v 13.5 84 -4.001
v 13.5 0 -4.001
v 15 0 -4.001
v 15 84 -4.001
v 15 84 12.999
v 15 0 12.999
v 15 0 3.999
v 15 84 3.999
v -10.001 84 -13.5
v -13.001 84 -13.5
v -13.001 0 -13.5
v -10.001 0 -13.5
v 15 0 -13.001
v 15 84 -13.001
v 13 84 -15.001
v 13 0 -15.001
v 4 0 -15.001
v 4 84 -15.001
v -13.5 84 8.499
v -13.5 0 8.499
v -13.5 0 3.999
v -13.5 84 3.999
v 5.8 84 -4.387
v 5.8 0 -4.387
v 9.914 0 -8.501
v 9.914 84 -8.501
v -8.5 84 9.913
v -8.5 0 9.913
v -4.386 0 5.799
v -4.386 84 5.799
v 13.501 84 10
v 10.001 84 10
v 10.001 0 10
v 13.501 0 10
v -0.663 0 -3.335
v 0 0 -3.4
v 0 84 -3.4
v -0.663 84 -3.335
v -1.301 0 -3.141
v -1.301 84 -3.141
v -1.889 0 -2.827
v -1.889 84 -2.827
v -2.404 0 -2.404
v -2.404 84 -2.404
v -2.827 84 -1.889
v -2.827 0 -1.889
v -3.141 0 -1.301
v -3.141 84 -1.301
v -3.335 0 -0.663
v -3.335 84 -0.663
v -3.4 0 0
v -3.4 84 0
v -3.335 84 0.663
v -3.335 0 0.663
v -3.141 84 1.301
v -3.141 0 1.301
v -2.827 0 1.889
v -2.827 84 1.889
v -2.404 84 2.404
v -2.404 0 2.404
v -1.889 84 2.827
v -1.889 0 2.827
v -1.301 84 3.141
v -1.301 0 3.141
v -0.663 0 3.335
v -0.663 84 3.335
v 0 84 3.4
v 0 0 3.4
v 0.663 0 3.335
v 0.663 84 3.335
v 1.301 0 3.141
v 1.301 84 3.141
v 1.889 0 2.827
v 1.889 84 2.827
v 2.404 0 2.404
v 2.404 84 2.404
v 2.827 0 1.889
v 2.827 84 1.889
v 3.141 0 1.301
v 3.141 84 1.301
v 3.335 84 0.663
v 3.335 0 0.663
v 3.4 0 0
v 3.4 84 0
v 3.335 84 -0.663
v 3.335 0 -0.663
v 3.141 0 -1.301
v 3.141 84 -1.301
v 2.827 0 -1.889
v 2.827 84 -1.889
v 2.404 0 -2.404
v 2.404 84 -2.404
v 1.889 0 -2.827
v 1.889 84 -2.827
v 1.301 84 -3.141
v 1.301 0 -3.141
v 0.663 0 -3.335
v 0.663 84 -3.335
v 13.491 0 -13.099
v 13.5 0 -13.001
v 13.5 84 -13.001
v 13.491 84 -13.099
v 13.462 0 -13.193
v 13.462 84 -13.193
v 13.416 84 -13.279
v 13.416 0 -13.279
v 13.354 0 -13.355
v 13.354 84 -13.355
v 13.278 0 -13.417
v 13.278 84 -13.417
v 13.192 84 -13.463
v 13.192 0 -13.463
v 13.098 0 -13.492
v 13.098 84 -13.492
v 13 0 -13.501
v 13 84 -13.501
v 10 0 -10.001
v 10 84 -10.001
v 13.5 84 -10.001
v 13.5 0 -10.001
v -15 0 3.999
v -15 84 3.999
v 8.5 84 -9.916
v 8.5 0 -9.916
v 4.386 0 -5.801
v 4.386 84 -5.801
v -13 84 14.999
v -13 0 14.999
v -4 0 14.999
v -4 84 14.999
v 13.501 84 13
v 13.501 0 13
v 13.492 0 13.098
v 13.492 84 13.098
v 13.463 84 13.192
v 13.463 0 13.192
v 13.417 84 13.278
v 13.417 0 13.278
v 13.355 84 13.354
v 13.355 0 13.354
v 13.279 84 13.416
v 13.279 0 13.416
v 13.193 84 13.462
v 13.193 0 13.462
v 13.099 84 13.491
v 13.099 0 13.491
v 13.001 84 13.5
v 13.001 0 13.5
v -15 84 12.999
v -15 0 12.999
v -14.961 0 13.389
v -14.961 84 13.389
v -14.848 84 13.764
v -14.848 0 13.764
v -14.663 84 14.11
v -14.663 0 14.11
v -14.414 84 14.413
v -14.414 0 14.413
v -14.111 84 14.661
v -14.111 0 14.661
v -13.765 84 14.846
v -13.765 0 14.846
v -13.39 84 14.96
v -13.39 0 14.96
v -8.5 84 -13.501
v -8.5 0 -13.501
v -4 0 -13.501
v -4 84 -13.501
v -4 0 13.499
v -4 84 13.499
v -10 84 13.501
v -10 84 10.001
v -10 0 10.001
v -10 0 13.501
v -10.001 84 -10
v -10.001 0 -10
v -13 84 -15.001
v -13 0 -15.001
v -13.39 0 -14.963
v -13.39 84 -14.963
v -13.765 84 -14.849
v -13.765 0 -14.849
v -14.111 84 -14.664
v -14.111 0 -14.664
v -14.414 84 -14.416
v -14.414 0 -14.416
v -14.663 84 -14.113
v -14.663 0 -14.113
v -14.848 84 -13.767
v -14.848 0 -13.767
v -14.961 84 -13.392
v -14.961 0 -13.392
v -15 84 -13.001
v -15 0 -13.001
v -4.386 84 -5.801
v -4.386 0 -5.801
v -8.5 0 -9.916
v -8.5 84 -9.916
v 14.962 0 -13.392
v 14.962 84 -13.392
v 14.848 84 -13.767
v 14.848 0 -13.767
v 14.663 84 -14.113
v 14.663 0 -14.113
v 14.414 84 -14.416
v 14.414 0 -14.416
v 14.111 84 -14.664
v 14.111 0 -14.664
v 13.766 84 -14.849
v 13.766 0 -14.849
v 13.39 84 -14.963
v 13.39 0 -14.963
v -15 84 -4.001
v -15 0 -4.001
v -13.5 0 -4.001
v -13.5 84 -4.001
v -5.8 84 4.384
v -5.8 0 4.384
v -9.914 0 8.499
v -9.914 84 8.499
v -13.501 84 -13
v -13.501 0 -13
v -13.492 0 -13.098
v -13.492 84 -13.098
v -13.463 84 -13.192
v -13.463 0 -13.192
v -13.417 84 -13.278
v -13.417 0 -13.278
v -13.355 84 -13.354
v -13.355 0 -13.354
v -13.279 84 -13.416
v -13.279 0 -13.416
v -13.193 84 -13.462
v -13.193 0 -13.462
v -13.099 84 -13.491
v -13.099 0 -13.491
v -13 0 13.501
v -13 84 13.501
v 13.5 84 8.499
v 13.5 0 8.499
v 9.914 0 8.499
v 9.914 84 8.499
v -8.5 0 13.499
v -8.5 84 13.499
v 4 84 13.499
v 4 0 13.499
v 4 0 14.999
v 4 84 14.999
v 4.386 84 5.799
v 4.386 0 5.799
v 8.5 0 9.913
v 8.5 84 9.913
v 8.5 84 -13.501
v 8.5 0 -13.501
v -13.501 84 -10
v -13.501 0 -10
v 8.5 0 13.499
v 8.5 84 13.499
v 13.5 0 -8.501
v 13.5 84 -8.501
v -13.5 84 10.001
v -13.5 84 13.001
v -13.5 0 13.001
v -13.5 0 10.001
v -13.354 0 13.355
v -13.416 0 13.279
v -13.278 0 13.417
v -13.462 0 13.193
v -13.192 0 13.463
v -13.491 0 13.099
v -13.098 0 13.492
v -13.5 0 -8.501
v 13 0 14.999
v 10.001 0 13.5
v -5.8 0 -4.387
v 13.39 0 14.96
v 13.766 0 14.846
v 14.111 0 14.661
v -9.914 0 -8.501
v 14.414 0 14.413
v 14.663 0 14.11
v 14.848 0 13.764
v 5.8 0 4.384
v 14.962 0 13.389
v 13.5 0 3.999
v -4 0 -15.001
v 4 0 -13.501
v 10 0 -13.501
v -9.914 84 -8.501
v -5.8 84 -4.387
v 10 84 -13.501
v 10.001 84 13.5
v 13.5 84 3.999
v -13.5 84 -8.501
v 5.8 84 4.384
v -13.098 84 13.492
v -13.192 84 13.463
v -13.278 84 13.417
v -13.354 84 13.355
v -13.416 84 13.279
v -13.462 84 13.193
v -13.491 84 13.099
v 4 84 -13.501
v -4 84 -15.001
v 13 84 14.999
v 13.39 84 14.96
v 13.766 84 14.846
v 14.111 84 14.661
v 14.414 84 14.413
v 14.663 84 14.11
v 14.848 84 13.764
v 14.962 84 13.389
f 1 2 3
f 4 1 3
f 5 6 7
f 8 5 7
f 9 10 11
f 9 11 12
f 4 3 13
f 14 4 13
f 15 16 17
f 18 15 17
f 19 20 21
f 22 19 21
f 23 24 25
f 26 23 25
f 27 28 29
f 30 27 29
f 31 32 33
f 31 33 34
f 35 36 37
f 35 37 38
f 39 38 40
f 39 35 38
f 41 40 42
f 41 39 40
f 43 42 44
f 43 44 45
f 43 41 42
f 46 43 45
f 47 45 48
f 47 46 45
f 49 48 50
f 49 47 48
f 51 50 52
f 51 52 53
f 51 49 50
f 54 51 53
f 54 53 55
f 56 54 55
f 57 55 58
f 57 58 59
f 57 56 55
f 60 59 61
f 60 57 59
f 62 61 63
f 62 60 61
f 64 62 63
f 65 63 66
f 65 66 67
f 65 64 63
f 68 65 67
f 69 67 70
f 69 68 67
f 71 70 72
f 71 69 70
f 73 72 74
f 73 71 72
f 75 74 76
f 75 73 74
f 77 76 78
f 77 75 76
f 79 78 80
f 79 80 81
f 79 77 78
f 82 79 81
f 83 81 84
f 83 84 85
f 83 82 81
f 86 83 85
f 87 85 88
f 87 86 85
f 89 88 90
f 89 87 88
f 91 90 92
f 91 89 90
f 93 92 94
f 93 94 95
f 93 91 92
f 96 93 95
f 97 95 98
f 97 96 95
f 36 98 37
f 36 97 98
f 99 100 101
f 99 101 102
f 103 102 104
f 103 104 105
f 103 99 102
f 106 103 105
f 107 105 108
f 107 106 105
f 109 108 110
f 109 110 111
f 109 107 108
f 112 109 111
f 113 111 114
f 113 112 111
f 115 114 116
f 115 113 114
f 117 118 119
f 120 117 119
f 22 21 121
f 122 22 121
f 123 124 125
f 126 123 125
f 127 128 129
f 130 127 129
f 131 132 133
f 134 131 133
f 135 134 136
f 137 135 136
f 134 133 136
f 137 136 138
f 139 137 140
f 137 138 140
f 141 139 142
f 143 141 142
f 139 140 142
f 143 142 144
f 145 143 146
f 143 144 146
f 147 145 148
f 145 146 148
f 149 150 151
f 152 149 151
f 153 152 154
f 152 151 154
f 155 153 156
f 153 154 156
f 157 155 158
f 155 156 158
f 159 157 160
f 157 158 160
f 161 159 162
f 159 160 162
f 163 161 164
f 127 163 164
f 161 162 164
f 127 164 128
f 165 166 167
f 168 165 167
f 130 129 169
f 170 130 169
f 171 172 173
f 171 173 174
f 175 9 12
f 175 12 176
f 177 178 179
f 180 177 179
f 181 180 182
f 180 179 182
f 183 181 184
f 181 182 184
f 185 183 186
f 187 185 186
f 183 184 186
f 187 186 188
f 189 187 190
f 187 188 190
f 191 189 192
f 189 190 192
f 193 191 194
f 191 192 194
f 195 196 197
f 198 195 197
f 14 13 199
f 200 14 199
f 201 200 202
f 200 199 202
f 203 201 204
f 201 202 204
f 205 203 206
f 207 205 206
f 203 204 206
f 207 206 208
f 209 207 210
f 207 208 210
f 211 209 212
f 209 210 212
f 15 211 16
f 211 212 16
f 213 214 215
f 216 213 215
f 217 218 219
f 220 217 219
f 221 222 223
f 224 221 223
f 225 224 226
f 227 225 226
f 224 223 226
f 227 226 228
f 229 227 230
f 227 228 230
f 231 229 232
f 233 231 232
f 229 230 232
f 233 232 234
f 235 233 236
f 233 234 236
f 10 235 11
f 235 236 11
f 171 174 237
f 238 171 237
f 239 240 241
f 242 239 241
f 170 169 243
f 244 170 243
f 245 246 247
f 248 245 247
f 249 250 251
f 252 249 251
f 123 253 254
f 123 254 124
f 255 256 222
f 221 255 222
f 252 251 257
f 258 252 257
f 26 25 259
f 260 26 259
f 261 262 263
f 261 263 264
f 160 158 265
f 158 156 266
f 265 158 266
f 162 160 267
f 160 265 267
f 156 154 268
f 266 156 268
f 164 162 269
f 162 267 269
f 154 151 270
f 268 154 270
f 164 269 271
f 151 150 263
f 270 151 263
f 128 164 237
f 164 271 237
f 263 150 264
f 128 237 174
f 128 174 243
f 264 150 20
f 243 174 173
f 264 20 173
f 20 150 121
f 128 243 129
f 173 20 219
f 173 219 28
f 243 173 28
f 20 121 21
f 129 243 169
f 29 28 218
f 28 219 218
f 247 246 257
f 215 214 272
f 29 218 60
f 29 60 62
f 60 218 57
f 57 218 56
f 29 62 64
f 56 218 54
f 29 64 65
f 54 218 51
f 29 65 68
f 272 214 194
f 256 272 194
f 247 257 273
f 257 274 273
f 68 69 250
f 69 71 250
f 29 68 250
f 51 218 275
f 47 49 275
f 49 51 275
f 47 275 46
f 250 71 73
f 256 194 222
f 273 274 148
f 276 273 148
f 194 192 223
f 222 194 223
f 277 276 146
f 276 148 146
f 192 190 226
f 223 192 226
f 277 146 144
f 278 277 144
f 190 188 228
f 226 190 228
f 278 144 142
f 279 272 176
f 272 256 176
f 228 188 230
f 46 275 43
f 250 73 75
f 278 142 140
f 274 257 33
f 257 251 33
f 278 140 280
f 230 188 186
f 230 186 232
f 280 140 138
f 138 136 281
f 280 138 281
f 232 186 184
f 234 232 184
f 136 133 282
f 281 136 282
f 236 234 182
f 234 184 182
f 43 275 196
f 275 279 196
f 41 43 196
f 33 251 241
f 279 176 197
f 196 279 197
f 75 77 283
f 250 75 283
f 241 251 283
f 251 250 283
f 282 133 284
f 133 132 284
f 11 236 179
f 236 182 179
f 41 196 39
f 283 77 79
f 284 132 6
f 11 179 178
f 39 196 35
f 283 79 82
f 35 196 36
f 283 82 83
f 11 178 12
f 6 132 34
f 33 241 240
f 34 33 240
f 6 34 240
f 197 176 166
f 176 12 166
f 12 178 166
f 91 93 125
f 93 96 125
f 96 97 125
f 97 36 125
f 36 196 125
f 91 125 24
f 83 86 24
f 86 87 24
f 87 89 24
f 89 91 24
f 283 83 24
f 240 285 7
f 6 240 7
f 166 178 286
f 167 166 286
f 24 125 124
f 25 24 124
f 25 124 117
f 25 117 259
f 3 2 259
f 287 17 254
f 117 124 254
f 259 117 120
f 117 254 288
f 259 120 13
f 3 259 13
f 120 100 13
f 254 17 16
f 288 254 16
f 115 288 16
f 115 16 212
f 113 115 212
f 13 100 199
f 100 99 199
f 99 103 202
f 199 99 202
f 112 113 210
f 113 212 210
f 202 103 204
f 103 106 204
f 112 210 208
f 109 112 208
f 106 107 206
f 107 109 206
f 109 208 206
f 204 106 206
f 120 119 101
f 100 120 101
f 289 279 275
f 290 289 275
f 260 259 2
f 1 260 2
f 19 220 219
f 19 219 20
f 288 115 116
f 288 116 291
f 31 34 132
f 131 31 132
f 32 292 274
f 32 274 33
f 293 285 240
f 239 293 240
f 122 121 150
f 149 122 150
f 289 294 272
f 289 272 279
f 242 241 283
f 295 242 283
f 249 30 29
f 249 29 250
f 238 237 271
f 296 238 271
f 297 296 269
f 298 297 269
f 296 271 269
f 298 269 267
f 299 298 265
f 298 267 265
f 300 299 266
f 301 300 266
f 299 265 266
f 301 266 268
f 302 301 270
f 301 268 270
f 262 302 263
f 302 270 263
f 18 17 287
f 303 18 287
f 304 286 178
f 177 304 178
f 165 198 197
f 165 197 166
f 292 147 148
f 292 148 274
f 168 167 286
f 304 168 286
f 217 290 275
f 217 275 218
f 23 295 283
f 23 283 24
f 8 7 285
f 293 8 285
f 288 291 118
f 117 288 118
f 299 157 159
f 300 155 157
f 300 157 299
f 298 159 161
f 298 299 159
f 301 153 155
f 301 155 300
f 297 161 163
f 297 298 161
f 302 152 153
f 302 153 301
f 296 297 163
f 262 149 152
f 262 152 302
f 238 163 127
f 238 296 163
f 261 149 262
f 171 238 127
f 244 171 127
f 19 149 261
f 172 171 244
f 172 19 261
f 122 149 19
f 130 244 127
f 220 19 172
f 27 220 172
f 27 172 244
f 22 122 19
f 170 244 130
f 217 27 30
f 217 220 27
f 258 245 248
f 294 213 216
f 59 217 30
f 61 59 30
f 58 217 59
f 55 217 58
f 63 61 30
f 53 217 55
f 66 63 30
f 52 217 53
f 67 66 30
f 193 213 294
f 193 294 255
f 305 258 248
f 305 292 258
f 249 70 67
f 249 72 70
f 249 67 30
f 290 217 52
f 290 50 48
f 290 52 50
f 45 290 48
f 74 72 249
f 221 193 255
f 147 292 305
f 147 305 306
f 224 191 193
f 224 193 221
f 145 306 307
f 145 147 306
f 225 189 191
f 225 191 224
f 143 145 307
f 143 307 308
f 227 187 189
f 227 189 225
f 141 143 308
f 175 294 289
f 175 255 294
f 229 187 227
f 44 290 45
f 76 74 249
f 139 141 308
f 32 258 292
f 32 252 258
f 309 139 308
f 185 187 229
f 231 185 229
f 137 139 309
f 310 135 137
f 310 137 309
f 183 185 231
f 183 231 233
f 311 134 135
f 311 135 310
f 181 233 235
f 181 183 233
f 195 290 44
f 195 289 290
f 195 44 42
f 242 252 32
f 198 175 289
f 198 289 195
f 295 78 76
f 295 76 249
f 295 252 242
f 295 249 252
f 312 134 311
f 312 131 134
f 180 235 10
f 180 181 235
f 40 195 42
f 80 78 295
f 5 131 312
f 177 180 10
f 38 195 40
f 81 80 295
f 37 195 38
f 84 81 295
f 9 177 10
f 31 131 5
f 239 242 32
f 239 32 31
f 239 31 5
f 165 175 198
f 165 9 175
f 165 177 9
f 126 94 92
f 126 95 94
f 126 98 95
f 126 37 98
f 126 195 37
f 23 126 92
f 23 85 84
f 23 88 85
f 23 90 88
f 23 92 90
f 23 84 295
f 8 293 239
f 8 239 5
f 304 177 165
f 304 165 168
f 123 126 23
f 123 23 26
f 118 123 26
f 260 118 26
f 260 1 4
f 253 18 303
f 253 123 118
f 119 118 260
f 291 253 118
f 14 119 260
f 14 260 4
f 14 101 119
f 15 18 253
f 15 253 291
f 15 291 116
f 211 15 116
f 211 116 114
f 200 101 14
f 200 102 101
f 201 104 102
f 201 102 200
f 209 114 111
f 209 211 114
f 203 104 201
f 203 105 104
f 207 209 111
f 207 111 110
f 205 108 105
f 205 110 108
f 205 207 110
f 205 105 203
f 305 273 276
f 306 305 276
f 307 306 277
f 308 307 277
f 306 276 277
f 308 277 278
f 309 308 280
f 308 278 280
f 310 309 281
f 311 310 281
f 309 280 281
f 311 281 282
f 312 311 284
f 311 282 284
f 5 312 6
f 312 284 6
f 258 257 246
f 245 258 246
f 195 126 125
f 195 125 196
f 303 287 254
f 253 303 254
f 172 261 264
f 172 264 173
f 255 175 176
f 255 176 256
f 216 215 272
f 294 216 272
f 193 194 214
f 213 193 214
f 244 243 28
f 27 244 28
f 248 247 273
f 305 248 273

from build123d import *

# Parameters (mm, degrees)
SZKIC2_R                    = 3.4
DODANIE_WYCI_GNI_CIE1_DEPTH = 84


with BuildPart() as part:
    # Szkic2 → Dodanie-wyciągnięcie1 (new body)
    with BuildSketch(Plane(origin=(0, 0, 0), x_dir=(1, 0, 0), z_dir=(0, 1, 0))):
        with BuildLine():
            Line((15.000219073, 4.001445911), (15.000219073, 13.001445911))
            ThreePointArc((15.000219073, 13.001445911), (14.414432635, 14.415659474), (13.000219073, 15.001445911))
            Line((13.000219073, 15.001445911), (4.000219073, 15.001445911))
            Line((4.000219073, 15.001445911), (4.000219073, 13.501445911))
            Line((4.000219073, 13.501445911), (8.500219073, 13.501445911))
            Line((8.500219073, 13.501445911), (8.500219073, 9.915659474))
            Line((8.500219073, 9.915659474), (4.38600551, 5.801445911))
            Line((4.38600551, 5.801445911), (-4.385567365, 5.801445911))
            Line((-4.385567365, 5.801445911), (-8.499780927, 9.915659474))
            Line((-8.499780927, 9.915659474), (-8.499780927, 13.501445911))
            Line((-8.499780927, 13.501445911), (-3.999780927, 13.501445911))
            Line((-3.999780927, 13.501445911), (-3.999780927, 15.001445911))
            Line((-3.999780927, 15.001445911), (-12.999780927, 15.001445911))
            ThreePointArc((-12.999780927, 15.001445911), (-14.41399449, 14.415659474), (-14.999780927, 13.001445911))
            Line((-14.999780927, 13.001445911), (-14.999780927, 4.001445911))
            Line((-14.999780927, 4.001445911), (-13.499780927, 4.001445911))
            Line((-13.499780927, 4.001445911), (-13.499780927, 8.501445911))
            Line((-13.499780927, 8.501445911), (-9.91399449, 8.501445911))
            Line((-9.91399449, 8.501445911), (-5.799780927, 4.387232349))
            Line((-5.799780927, 4.387232349), (-5.799780927, -4.384340526))
            Line((-5.799780927, -4.384340526), (-9.91399449, -8.498554089))
            Line((-9.91399449, -8.498554089), (-13.499780927, -8.498554089))
            Line((-13.499780927, -8.498554089), (-13.499780927, -3.998554089))
            Line((-13.499780927, -3.998554089), (-14.999780927, -3.998554089))
            Line((-14.999780927, -3.998554089), (-14.999780927, -12.998554089))
            ThreePointArc((-14.999780927, -12.998554089), (-14.41399449, -14.412767651), (-12.999780927, -14.998554089))
            Line((-12.999780927, -14.998554089), (-3.999780927, -14.998554089))
            Line((-3.999780927, -14.998554089), (-3.999780927, -13.498554089))
            Line((-3.999780927, -13.498554089), (-8.499780927, -13.498554089))
            Line((-8.499780927, -13.498554089), (-8.499780927, -9.912767651))
            Line((-8.499780927, -9.912767651), (-4.385567365, -5.798554089))
            Line((-4.385567365, -5.798554089), (4.38600551, -5.798554089))
            Line((4.38600551, -5.798554089), (8.500219073, -9.912767651))
            Line((8.500219073, -9.912767651), (8.500219073, -13.498554089))
            Line((8.500219073, -13.498554089), (4.000219073, -13.498554089))
            Line((4.000219073, -13.498554089), (4.000219073, -14.998554089))
            Line((4.000219073, -14.998554089), (13.000219073, -14.998554089))
            ThreePointArc((13.000219073, -14.998554089), (14.414432635, -14.412767651), (15.000219073, -12.998554089))
            Line((15.000219073, -12.998554089), (15.000219073, -3.998554089))
            Line((15.000219073, -3.998554089), (13.500219073, -3.998554089))
            Line((13.500219073, -3.998554089), (13.500219073, -8.498554089))
            Line((13.500219073, -8.498554089), (9.914432635, -8.498554089))
            Line((9.914432635, -8.498554089), (5.800219073, -4.384340526))
            Line((5.800219073, -4.384340526), (5.800219073, 4.387232349))
            Line((5.800219073, 4.387232349), (9.914432635, 8.501445911))
            Line((9.914432635, 8.501445911), (13.500219073, 8.501445911))
            Line((13.500219073, 8.501445911), (13.500219073, 4.001445911))
            Line((13.500219073, 4.001445911), (15.000219073, 4.001445911))
        make_face()
        with Locations(Location((0, 0, 0), (0, 0, 90))):
            Circle(SZKIC2_R, mode=Mode.SUBTRACT)
        with BuildLine():
            Line((10.001445911, -10.000219073), (13.501445911, -10.000219073))
            Line((13.501445911, -10.000219073), (13.501445911, -13.000219073))
            ThreePointArc((13.501445911, -13.000219073), (13.354999302, -13.353772463), (13.001445911, -13.500219073))
            Line((13.001445911, -13.500219073), (10.001445911, -13.500219073))
            Line((10.001445911, -13.500219073), (10.001445911, -10.000219073))
        make_face(mode=Mode.SUBTRACT)
        with BuildLine():
            Line((10.000219073, 10.001445911), (13.500219073, 10.001445911))
            Line((13.500219073, 10.001445911), (13.500219073, 13.001445911))
            ThreePointArc((13.500219073, 13.001445911), (13.353772463, 13.354999302), (13.000219073, 13.501445911))
            Line((13.000219073, 13.501445911), (10.000219073, 13.501445911))
            Line((10.000219073, 13.501445911), (10.000219073, 10.001445911))
        make_face(mode=Mode.SUBTRACT)
        with BuildLine():
            Line((-10.000219073, -10.001445911), (-10.000219073, -13.501445911))
            Line((-10.000219073, -13.501445911), (-13.000219073, -13.501445911))
            ThreePointArc((-13.000219073, -13.501445911), (-13.353772463, -13.354999302), (-13.500219073, -13.001445911))
            Line((-13.500219073, -13.001445911), (-13.500219073, -10.001445911))
            Line((-13.500219073, -10.001445911), (-10.000219073, -10.001445911))
        make_face(mode=Mode.SUBTRACT)
        with BuildLine():
            Line((-10.001445911, 10.000219073), (-13.501445911, 10.000219073))
            Line((-13.501445911, 10.000219073), (-13.501445911, 13.000219073))
            ThreePointArc((-13.501445911, 13.000219073), (-13.354999302, 13.353772463), (-13.001445911, 13.500219073))
            Line((-13.001445911, 13.500219073), (-10.001445911, 13.500219073))
            Line((-10.001445911, 13.500219073), (-10.001445911, 10.000219073))
        make_face(mode=Mode.SUBTRACT)
    extrude(amount=DODANIE_WYCI_GNI_CIE1_DEPTH)


solid = part.part
